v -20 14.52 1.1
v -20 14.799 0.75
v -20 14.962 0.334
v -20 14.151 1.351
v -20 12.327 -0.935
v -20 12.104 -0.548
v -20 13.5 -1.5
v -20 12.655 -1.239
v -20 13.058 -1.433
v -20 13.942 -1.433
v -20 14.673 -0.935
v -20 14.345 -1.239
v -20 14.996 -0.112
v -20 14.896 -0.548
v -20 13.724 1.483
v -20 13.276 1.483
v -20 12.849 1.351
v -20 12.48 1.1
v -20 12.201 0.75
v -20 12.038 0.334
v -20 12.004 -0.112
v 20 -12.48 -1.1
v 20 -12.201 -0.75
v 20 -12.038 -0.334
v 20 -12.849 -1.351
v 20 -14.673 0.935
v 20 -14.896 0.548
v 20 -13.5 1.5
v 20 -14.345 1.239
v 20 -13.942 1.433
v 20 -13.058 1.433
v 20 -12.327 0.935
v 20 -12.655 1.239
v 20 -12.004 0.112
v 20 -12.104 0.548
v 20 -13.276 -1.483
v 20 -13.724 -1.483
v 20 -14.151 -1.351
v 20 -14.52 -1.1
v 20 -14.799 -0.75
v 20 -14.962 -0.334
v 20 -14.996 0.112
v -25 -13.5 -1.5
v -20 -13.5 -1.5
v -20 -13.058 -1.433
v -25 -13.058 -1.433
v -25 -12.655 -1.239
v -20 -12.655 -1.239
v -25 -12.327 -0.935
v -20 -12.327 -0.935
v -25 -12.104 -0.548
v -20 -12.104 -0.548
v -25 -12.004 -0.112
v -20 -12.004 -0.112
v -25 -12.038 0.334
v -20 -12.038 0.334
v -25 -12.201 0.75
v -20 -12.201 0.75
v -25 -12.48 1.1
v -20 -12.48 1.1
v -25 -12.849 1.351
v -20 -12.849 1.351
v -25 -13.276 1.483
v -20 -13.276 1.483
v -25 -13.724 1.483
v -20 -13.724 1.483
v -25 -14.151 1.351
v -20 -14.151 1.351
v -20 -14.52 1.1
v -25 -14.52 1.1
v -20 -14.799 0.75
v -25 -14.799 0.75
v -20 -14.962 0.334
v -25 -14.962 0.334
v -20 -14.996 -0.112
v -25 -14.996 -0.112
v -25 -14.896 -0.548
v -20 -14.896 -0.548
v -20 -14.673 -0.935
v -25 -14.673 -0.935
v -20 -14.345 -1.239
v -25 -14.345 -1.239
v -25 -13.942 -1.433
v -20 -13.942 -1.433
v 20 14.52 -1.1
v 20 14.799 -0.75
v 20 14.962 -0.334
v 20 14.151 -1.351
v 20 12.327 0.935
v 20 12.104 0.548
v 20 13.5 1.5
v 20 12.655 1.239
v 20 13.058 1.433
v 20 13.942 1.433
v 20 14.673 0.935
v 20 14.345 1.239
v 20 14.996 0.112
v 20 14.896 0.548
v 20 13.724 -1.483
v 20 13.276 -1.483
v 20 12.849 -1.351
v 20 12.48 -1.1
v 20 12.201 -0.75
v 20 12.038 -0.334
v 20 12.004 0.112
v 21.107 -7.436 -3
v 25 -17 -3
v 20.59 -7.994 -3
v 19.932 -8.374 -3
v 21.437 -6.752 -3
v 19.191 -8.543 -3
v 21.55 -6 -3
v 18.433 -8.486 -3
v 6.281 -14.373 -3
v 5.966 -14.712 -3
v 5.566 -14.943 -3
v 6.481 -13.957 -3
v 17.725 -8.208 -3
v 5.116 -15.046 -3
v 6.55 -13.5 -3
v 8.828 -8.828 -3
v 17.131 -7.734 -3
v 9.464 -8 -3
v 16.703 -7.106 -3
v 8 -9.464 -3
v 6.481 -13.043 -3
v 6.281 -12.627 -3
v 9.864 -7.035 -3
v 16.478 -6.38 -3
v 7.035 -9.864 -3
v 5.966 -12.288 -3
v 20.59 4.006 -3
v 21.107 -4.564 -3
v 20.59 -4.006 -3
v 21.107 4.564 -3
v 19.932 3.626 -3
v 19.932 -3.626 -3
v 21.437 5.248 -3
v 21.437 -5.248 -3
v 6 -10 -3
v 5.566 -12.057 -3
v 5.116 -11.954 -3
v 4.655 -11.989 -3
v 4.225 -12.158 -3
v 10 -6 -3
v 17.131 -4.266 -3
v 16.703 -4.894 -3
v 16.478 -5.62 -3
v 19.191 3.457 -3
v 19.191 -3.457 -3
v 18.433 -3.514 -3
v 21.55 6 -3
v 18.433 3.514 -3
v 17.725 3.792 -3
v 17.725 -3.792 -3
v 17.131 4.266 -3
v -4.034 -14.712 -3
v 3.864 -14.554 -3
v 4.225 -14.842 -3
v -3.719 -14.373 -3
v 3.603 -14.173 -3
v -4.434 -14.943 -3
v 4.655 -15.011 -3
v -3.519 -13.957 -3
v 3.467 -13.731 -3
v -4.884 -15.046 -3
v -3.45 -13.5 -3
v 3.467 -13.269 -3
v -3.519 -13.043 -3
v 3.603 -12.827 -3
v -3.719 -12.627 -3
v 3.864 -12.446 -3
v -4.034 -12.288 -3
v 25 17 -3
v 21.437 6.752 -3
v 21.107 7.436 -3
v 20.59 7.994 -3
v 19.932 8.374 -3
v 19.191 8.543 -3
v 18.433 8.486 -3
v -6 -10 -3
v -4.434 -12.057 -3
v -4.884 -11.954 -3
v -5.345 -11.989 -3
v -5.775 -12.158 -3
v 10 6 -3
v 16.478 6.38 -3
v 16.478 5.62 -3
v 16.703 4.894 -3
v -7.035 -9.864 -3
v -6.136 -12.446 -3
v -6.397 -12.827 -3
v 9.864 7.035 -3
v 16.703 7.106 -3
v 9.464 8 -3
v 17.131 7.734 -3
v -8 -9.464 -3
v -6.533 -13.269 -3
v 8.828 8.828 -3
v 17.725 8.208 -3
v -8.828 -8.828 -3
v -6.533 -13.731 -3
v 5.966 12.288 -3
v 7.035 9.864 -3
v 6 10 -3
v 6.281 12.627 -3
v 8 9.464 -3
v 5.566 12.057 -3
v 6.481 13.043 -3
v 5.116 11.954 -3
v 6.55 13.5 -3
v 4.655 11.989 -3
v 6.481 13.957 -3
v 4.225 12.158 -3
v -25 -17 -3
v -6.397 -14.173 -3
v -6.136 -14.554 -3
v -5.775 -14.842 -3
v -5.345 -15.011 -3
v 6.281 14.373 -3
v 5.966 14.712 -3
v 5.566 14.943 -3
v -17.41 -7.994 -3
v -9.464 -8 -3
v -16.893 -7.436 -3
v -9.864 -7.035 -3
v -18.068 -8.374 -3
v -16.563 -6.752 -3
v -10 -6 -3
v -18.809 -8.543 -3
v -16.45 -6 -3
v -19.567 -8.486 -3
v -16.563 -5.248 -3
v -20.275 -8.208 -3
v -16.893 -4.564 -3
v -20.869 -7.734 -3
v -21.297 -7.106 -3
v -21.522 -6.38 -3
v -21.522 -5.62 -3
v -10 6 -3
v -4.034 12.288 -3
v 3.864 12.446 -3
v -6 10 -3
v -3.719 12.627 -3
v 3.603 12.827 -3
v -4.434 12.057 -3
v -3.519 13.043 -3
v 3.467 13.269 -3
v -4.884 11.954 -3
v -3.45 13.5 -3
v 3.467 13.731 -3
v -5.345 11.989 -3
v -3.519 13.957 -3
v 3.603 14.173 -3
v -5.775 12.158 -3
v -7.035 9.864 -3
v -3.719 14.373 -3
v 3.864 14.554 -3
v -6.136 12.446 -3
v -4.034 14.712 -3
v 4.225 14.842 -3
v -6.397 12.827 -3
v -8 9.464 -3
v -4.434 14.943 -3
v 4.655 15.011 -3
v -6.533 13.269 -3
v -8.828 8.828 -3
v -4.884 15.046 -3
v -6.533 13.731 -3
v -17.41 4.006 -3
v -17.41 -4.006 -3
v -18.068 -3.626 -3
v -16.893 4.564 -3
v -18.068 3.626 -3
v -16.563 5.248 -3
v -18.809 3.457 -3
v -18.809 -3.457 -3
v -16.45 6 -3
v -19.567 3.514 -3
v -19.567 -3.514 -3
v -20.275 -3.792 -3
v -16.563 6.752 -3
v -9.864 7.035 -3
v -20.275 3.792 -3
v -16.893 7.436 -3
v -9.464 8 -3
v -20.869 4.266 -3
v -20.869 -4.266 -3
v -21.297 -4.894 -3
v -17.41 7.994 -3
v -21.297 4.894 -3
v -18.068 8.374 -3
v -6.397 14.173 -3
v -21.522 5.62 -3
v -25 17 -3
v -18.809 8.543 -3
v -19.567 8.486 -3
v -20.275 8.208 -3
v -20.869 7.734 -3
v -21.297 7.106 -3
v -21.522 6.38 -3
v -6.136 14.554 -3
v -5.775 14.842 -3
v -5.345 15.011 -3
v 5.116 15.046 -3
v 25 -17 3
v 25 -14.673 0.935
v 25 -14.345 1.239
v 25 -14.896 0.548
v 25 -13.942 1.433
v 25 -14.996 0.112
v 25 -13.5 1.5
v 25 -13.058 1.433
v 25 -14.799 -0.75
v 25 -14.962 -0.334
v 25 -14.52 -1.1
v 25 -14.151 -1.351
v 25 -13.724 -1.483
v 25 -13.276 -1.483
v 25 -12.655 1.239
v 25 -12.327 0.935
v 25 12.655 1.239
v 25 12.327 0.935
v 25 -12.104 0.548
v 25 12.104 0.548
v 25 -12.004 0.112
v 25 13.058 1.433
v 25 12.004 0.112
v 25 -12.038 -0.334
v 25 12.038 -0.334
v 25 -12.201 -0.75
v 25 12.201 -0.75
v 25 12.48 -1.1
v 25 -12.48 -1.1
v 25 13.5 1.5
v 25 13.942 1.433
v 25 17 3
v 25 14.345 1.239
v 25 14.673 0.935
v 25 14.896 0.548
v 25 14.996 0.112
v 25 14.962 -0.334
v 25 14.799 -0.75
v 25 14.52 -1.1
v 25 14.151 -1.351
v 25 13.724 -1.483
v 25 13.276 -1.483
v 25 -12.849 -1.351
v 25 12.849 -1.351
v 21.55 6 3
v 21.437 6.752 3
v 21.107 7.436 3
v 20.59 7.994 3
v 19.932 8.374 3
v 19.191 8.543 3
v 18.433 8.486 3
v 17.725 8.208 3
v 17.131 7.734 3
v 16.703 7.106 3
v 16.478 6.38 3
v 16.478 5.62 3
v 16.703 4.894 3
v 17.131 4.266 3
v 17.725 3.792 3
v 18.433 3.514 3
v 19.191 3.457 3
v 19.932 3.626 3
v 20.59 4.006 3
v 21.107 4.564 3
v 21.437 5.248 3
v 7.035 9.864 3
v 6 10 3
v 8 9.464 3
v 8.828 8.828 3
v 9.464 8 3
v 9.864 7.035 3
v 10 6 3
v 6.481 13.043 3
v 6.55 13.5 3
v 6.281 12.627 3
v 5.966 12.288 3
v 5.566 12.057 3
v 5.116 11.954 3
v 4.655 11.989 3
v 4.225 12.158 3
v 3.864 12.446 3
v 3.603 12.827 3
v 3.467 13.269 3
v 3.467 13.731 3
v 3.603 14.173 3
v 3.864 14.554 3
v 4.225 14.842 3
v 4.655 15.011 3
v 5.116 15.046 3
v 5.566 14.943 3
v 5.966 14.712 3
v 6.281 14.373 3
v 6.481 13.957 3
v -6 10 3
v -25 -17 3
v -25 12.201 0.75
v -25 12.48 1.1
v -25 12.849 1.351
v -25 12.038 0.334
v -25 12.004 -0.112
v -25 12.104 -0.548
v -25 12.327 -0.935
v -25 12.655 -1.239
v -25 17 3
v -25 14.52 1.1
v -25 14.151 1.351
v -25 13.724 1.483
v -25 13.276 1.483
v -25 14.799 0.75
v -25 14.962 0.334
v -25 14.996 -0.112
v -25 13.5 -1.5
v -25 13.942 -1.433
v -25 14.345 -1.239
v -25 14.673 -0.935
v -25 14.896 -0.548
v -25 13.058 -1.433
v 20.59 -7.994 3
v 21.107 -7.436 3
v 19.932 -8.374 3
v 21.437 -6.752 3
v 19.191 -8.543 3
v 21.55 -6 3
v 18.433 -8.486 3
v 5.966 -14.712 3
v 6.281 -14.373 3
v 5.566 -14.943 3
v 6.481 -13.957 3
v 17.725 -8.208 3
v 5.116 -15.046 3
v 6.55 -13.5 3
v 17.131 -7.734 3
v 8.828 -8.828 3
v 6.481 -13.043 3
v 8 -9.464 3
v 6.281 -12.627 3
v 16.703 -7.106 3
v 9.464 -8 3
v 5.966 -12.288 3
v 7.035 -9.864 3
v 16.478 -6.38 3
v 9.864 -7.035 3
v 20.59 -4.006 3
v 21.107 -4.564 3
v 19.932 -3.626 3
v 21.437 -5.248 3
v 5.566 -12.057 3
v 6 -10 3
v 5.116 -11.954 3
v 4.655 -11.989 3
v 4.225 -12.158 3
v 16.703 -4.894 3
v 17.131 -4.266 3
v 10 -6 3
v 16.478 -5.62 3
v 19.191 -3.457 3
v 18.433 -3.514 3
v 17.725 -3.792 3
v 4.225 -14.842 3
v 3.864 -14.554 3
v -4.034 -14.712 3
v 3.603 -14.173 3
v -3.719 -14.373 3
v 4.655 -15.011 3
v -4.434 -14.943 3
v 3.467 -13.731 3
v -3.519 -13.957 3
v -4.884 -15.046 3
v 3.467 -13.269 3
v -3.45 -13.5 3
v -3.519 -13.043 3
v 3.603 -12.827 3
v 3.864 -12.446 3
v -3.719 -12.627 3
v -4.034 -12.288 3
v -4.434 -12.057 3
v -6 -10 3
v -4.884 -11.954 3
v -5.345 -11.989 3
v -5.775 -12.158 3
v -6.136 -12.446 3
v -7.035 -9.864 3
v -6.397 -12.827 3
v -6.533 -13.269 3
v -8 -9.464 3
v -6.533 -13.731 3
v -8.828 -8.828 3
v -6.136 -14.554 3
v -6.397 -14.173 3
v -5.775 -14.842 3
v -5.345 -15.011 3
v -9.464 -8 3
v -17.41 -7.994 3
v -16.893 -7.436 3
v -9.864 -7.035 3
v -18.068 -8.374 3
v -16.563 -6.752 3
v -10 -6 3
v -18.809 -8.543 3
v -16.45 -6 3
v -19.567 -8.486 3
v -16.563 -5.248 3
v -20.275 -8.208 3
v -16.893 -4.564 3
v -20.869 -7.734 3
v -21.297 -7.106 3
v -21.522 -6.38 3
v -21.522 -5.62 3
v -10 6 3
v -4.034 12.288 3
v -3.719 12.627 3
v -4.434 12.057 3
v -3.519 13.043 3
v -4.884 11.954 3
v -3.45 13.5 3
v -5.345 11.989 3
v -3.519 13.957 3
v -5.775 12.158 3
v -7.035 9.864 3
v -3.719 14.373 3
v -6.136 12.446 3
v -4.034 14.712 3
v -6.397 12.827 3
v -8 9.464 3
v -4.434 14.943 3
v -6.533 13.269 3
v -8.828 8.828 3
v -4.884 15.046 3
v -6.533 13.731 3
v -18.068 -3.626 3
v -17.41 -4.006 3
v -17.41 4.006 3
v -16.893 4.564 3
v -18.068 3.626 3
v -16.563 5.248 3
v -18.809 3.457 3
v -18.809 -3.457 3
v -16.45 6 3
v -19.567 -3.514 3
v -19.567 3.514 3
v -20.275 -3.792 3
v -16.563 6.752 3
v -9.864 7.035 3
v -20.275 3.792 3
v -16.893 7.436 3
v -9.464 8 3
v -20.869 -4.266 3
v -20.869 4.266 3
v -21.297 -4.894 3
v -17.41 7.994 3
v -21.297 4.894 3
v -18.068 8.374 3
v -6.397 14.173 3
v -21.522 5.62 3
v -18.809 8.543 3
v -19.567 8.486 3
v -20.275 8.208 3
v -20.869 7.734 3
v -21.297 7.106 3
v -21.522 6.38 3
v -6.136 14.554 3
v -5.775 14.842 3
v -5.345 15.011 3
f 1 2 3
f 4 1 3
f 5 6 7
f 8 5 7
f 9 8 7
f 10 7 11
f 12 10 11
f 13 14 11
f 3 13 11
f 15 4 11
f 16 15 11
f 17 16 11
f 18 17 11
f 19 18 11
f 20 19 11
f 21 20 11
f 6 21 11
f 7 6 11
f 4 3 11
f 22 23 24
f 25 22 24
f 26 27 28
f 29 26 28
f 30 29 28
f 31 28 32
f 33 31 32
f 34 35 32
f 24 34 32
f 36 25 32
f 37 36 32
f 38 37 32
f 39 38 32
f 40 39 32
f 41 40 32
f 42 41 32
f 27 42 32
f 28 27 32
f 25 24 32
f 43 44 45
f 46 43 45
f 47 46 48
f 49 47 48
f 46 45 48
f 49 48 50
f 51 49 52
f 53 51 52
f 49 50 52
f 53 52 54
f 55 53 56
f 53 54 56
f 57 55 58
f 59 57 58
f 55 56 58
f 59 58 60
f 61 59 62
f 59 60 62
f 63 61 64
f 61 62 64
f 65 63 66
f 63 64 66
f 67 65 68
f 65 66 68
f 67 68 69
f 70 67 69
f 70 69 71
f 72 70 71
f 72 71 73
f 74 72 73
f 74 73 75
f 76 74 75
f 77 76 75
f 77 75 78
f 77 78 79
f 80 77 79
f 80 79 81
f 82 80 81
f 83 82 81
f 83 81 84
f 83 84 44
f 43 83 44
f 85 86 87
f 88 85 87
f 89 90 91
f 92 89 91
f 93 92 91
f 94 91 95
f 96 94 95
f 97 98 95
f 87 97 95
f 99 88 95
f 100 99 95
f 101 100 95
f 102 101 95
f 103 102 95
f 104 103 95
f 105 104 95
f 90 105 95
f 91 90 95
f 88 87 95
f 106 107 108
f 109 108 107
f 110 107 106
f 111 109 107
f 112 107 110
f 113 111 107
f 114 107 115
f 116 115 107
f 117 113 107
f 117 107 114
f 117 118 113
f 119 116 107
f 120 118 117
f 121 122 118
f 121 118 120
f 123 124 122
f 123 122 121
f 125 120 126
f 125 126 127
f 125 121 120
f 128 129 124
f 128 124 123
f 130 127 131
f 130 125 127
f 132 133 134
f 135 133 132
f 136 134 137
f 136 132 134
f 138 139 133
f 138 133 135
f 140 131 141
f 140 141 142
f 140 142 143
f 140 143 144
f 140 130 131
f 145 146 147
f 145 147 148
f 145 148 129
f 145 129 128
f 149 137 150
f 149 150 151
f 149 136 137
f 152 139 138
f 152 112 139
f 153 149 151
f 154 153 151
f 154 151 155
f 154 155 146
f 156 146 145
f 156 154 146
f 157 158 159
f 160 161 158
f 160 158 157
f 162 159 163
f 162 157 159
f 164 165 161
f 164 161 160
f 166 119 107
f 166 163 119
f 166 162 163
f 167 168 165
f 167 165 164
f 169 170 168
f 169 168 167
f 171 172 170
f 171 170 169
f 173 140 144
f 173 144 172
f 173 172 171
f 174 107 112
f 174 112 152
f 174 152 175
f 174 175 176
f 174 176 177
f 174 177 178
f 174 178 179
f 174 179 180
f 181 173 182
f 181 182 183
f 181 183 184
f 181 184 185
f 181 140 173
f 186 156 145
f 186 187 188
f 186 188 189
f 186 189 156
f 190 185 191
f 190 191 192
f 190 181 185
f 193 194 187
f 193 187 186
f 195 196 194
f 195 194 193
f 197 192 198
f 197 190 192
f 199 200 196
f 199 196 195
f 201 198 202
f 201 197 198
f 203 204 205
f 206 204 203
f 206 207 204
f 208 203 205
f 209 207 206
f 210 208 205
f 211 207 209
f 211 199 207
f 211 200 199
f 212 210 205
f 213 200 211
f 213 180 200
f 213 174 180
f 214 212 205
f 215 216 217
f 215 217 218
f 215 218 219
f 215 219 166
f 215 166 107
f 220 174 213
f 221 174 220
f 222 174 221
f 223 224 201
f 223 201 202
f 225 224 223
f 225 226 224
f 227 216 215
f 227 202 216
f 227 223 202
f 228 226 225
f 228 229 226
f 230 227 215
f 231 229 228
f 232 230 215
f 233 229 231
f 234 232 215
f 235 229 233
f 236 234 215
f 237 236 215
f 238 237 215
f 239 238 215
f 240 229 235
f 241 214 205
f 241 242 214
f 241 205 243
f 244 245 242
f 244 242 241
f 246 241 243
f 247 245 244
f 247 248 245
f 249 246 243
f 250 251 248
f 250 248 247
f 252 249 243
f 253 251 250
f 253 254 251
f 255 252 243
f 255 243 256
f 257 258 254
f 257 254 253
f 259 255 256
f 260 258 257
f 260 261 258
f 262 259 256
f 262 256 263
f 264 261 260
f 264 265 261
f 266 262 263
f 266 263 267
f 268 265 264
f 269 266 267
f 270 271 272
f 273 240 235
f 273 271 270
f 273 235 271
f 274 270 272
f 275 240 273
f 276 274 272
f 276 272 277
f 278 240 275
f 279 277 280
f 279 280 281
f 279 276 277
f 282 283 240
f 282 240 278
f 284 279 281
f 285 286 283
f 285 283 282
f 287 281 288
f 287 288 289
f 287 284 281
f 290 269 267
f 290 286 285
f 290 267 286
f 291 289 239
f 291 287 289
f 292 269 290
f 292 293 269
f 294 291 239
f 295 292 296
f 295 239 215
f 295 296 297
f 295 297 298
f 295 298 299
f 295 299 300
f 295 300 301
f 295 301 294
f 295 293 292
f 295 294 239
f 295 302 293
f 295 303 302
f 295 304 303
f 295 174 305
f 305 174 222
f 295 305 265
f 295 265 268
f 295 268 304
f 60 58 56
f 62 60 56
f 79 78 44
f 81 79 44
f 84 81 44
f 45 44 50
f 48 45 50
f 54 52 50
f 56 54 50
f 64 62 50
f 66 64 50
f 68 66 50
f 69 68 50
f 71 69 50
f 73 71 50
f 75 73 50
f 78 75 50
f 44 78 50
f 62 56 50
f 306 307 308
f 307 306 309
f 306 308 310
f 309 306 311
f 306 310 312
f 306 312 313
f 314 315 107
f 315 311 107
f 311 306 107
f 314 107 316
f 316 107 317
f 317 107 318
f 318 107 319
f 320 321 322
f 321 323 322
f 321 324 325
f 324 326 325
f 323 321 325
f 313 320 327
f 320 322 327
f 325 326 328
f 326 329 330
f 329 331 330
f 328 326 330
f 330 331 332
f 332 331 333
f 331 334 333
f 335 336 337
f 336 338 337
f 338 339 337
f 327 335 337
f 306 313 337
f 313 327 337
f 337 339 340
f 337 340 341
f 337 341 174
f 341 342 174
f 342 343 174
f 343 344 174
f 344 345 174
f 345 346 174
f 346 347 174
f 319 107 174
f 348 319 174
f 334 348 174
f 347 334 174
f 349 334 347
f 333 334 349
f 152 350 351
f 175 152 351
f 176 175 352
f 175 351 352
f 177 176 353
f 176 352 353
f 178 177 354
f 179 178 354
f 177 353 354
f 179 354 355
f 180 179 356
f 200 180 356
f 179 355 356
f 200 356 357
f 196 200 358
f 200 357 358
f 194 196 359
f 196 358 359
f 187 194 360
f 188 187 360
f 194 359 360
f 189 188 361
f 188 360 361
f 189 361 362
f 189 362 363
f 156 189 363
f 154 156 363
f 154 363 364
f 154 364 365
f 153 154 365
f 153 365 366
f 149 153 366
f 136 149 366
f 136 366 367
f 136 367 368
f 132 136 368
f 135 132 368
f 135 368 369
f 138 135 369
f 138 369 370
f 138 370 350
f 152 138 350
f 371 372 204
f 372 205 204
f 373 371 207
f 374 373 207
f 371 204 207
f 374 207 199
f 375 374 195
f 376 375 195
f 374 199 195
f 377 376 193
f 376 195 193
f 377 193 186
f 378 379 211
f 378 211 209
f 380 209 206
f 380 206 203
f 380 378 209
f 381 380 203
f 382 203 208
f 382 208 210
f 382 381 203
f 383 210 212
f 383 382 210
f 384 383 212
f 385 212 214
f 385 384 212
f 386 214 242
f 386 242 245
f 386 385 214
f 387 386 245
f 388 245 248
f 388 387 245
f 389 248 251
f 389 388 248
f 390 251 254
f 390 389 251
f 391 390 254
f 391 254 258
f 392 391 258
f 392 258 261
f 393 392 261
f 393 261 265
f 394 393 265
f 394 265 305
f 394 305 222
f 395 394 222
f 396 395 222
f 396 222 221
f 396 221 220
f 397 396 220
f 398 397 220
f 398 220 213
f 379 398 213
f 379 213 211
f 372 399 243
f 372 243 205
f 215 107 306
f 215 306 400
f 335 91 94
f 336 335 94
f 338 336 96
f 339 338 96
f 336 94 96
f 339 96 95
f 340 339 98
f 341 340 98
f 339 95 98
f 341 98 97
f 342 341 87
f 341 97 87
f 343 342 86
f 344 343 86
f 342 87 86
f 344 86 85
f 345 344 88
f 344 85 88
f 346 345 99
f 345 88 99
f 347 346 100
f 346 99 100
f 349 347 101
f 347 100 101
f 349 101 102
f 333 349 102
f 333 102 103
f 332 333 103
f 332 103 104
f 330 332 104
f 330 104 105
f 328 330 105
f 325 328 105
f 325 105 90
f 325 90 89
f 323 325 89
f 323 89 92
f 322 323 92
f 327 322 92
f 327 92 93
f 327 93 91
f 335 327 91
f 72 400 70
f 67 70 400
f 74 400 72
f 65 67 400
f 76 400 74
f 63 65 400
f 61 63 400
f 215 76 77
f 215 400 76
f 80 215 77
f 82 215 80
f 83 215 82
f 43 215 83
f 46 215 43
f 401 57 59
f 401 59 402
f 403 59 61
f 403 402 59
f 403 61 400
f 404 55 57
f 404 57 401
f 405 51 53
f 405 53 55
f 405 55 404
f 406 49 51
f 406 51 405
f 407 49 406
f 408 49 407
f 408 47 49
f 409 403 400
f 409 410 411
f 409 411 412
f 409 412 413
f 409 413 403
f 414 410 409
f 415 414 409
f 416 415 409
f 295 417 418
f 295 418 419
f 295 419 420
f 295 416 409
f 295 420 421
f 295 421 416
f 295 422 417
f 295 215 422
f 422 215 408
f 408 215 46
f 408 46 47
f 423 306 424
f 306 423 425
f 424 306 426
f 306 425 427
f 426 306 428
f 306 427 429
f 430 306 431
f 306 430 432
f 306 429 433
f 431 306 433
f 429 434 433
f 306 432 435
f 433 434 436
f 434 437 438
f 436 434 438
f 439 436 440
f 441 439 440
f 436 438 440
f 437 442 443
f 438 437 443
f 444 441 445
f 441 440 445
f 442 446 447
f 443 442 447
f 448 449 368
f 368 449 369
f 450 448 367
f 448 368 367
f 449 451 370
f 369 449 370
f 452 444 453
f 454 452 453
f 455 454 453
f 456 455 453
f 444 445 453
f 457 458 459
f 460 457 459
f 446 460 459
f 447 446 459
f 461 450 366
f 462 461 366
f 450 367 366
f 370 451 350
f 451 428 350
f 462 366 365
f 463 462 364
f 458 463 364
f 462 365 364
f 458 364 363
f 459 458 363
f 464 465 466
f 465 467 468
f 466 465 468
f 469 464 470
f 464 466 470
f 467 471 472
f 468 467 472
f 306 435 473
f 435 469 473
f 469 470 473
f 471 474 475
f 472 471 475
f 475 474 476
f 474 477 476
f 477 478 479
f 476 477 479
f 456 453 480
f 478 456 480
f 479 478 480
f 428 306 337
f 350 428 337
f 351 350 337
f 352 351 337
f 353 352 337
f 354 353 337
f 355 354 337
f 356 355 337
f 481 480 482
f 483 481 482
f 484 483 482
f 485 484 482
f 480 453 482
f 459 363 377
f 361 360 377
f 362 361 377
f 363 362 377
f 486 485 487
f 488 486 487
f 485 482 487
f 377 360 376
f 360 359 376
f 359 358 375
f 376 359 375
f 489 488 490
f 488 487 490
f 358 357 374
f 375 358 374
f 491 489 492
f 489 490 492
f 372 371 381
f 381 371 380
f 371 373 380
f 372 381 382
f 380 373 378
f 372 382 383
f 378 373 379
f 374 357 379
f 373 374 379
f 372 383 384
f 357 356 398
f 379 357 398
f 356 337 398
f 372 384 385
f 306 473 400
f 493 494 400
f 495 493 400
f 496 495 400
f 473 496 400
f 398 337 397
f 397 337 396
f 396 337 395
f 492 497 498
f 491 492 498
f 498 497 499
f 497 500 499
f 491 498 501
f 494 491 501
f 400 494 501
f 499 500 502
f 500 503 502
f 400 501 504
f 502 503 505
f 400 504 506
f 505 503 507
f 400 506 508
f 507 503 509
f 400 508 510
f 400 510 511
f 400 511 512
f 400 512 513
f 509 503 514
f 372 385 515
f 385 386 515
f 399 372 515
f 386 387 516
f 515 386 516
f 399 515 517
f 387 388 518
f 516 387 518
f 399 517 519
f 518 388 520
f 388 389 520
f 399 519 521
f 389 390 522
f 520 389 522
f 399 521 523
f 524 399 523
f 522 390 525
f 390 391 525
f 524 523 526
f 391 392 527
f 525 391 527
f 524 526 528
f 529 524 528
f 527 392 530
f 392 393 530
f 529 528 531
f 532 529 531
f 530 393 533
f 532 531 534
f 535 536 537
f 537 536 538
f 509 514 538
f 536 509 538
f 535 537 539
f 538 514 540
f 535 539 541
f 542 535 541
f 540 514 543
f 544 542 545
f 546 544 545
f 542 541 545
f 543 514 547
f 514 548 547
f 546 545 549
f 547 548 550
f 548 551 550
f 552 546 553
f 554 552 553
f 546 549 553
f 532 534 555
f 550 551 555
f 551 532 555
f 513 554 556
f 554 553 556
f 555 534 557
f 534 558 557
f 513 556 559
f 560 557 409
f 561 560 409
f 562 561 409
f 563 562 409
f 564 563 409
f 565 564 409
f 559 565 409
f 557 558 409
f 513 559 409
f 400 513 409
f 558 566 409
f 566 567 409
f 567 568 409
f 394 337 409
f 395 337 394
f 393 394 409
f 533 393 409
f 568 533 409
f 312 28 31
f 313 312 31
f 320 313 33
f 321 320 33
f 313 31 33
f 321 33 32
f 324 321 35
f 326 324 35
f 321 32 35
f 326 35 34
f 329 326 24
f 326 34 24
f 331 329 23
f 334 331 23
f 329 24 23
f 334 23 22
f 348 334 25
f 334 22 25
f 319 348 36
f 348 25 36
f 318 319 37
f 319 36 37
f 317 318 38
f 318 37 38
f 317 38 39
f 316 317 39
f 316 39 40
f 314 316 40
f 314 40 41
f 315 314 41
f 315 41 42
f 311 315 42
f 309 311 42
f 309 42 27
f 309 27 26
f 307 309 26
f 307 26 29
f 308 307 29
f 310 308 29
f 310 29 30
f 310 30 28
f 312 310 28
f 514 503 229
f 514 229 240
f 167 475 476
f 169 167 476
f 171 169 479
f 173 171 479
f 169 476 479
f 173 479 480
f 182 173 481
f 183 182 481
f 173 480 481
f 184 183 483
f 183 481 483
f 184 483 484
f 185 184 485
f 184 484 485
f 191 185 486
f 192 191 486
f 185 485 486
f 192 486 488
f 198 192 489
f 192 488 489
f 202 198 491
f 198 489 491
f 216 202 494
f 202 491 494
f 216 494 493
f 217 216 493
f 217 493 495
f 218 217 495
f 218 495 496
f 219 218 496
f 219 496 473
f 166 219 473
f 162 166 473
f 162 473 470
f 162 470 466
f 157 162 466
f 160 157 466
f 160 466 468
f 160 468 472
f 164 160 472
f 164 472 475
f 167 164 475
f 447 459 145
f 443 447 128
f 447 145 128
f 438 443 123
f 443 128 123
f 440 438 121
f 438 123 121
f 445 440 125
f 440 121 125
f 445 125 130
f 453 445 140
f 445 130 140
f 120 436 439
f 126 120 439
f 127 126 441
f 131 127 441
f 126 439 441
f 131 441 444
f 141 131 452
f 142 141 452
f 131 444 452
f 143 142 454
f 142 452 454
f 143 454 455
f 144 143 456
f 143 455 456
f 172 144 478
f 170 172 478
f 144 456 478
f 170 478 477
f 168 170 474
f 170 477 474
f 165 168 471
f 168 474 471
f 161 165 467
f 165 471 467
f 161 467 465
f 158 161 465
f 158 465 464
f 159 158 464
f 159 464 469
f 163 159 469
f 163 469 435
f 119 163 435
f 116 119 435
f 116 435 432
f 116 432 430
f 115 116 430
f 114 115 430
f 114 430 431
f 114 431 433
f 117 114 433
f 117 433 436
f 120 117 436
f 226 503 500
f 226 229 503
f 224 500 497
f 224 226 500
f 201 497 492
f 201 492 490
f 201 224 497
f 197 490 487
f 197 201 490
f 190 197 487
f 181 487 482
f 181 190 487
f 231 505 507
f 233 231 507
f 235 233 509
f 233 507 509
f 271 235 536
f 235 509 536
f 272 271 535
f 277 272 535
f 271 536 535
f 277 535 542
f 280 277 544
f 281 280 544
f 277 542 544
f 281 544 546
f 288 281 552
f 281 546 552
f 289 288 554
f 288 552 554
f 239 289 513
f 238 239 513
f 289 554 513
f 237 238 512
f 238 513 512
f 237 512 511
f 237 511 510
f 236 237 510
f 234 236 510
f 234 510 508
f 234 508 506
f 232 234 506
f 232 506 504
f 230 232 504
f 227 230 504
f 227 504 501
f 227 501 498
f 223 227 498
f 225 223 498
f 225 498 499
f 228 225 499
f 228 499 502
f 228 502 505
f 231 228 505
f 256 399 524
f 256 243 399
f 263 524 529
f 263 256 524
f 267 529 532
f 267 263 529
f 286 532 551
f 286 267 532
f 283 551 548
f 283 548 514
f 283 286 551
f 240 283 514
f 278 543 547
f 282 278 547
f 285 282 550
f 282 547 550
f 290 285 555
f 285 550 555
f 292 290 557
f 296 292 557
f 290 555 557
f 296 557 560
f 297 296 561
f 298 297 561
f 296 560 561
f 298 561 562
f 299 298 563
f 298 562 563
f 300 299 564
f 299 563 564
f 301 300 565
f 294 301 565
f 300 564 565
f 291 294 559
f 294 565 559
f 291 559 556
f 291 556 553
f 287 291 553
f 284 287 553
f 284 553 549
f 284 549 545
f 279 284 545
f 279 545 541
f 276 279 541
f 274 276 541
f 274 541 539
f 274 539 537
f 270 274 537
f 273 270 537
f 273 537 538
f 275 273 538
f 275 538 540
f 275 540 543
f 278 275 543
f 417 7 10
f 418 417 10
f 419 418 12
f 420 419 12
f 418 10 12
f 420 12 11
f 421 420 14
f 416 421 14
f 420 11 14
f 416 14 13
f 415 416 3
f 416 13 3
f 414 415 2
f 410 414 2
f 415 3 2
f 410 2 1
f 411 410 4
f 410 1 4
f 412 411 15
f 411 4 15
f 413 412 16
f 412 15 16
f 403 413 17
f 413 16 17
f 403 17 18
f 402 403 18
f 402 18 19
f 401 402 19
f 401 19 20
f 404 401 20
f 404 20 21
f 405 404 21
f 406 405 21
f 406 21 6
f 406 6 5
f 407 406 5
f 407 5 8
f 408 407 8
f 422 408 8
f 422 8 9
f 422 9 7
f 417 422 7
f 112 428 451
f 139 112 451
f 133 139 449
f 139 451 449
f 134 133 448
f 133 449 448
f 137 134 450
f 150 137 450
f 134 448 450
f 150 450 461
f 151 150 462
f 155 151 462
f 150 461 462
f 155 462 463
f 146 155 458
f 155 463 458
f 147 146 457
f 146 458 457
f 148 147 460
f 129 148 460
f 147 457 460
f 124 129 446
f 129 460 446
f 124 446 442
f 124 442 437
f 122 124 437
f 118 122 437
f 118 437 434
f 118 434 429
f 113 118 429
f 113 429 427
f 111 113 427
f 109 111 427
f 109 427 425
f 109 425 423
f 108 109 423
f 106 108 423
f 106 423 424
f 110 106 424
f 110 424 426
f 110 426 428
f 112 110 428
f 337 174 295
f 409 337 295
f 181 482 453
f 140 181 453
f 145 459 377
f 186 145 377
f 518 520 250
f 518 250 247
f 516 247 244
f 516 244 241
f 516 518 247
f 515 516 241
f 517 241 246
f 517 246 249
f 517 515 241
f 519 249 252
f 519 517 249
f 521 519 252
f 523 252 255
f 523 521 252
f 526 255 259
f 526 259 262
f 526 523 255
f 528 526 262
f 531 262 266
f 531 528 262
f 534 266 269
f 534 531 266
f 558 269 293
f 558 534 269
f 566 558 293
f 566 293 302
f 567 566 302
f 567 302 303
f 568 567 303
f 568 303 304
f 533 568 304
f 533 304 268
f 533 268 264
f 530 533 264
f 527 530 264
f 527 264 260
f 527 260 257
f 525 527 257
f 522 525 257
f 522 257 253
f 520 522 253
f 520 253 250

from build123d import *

# Parameters (mm, degrees)
SKETCH_1_W                = 50
SKETCH_1_H                = 34
EXTRUDE_1_DEPTH           = 6
SKETCH_2_W                = 20
SKETCH_2_H                = 20
CUT_EXTRUDE_1_DEPTH       = 31.822070015
HOLE_WIZARD_5_1_5_1_1_D   = 5.1
HOLE_WIZARD_3_0_3_1_D     = 3
HOLE_WIZARD_3_0_3_1_DEPTH = 5
HOLE_WIZARD_3_0_3_2_D     = 3
HOLE_WIZARD_3_0_3_2_DEPTH = 5
FILLET_1_R                = 4
CUT_EXTRUDE_3_REACH       = 32.822
SKETCH_9_R                = 1.55


with BuildPart() as part:
    # 草图1 → 凸台-拉伸1 (new body)
    with BuildSketch(Plane(origin=(0, 0, -3), x_dir=(-1, 0, 0), z_dir=(0, 0, -1))):
        Rectangle(SKETCH_1_W, SKETCH_1_H)
    extrude(amount=-EXTRUDE_1_DEPTH)

    # 草图2 → 切除-拉伸1 (cut, through all)
    with BuildSketch(Plane.XY.offset(3)):
        Rectangle(SKETCH_2_W, SKETCH_2_H)
    extrude(amount=-CUT_EXTRUDE_1_DEPTH, mode=Mode.SUBTRACT)

    # Ø5.1 (5.1) 直径孔1 (through all)
    with Locations(Plane(origin=(0, 0, -3), x_dir=(-1, 0, 0), z_dir=(0, 0, -1))):
        with Locations((-19, 6), (19, -6), (-19, -6), (19, 6)):
            Hole(HOLE_WIZARD_5_1_5_1_1_D / 2)

    # Ø3.0 (3) 直径孔1
    with Locations(Plane.ZY.offset(25)):
        with Locations((0, -13.5), (0, 13.5)):
            Hole(HOLE_WIZARD_3_0_3_1_D / 2, depth=HOLE_WIZARD_3_0_3_1_DEPTH)

    # Ø3.0 (3) 直径孔2
    with Locations(Plane(origin=(25, 0, 0), x_dir=(0, 0, -1), z_dir=(1, 0, 0))):
        with Locations((0, -13.5), (0, 13.5)):
            Hole(HOLE_WIZARD_3_0_3_2_D / 2, depth=HOLE_WIZARD_3_0_3_2_DEPTH)

    # 圆角1
    fillet_1_edges = [part.edges().sort_by_distance(p)[0] for p in [
        (10, 10, 0),
        (10, -10, 0),
        (-10, -10, 0),
        (-10, 10, 0),
    ]]
    fillet(fillet_1_edges, radius=FILLET_1_R)

    # 草图9 → 切除-拉伸3 (cut, up to next)
    with BuildSketch(Plane.XY.offset(3), mode=Mode.PRIVATE) as cut_extrude_3_sk1:
        with Locations((5, -13.5)):
            Circle(SKETCH_9_R)
    cut_extrude_3_tool1 = extrude(cut_extrude_3_sk1.sketch, amount=-CUT_EXTRUDE_3_REACH, mode=Mode.PRIVATE) & part.part
    # 草图9 → 切除-拉伸3 (cut, up to next)
    with BuildSketch(Plane.XY.offset(3), mode=Mode.PRIVATE) as cut_extrude_3_sk2:
        with Locations((-5, -13.5)):
            Circle(SKETCH_9_R)
    cut_extrude_3_tool2 = extrude(cut_extrude_3_sk2.sketch, amount=-CUT_EXTRUDE_3_REACH, mode=Mode.PRIVATE) & part.part
    cut_extrude_3_1 = cut_extrude_3_tool1.solids().sort_by_distance((5, -13.5, 3))[0]
    add(cut_extrude_3_1, mode=Mode.SUBTRACT)
    cut_extrude_3_2 = cut_extrude_3_tool2.solids().sort_by_distance((-5, -13.5, 3))[0]
    add(cut_extrude_3_2, mode=Mode.SUBTRACT)
    cut_extrude_3 = cut_extrude_3_1 + cut_extrude_3_2  # 切除-拉伸3 as one shape, for the pattern or mirror that repeats it

    # 镜向1: 切除-拉伸3 across plane
    add(cut_extrude_3.mirror(Plane(origin=(0, 0, 0), x_dir=(0, 0, 1), z_dir=(0, -1, 0))), mode=Mode.SUBTRACT)


solid = part.part
